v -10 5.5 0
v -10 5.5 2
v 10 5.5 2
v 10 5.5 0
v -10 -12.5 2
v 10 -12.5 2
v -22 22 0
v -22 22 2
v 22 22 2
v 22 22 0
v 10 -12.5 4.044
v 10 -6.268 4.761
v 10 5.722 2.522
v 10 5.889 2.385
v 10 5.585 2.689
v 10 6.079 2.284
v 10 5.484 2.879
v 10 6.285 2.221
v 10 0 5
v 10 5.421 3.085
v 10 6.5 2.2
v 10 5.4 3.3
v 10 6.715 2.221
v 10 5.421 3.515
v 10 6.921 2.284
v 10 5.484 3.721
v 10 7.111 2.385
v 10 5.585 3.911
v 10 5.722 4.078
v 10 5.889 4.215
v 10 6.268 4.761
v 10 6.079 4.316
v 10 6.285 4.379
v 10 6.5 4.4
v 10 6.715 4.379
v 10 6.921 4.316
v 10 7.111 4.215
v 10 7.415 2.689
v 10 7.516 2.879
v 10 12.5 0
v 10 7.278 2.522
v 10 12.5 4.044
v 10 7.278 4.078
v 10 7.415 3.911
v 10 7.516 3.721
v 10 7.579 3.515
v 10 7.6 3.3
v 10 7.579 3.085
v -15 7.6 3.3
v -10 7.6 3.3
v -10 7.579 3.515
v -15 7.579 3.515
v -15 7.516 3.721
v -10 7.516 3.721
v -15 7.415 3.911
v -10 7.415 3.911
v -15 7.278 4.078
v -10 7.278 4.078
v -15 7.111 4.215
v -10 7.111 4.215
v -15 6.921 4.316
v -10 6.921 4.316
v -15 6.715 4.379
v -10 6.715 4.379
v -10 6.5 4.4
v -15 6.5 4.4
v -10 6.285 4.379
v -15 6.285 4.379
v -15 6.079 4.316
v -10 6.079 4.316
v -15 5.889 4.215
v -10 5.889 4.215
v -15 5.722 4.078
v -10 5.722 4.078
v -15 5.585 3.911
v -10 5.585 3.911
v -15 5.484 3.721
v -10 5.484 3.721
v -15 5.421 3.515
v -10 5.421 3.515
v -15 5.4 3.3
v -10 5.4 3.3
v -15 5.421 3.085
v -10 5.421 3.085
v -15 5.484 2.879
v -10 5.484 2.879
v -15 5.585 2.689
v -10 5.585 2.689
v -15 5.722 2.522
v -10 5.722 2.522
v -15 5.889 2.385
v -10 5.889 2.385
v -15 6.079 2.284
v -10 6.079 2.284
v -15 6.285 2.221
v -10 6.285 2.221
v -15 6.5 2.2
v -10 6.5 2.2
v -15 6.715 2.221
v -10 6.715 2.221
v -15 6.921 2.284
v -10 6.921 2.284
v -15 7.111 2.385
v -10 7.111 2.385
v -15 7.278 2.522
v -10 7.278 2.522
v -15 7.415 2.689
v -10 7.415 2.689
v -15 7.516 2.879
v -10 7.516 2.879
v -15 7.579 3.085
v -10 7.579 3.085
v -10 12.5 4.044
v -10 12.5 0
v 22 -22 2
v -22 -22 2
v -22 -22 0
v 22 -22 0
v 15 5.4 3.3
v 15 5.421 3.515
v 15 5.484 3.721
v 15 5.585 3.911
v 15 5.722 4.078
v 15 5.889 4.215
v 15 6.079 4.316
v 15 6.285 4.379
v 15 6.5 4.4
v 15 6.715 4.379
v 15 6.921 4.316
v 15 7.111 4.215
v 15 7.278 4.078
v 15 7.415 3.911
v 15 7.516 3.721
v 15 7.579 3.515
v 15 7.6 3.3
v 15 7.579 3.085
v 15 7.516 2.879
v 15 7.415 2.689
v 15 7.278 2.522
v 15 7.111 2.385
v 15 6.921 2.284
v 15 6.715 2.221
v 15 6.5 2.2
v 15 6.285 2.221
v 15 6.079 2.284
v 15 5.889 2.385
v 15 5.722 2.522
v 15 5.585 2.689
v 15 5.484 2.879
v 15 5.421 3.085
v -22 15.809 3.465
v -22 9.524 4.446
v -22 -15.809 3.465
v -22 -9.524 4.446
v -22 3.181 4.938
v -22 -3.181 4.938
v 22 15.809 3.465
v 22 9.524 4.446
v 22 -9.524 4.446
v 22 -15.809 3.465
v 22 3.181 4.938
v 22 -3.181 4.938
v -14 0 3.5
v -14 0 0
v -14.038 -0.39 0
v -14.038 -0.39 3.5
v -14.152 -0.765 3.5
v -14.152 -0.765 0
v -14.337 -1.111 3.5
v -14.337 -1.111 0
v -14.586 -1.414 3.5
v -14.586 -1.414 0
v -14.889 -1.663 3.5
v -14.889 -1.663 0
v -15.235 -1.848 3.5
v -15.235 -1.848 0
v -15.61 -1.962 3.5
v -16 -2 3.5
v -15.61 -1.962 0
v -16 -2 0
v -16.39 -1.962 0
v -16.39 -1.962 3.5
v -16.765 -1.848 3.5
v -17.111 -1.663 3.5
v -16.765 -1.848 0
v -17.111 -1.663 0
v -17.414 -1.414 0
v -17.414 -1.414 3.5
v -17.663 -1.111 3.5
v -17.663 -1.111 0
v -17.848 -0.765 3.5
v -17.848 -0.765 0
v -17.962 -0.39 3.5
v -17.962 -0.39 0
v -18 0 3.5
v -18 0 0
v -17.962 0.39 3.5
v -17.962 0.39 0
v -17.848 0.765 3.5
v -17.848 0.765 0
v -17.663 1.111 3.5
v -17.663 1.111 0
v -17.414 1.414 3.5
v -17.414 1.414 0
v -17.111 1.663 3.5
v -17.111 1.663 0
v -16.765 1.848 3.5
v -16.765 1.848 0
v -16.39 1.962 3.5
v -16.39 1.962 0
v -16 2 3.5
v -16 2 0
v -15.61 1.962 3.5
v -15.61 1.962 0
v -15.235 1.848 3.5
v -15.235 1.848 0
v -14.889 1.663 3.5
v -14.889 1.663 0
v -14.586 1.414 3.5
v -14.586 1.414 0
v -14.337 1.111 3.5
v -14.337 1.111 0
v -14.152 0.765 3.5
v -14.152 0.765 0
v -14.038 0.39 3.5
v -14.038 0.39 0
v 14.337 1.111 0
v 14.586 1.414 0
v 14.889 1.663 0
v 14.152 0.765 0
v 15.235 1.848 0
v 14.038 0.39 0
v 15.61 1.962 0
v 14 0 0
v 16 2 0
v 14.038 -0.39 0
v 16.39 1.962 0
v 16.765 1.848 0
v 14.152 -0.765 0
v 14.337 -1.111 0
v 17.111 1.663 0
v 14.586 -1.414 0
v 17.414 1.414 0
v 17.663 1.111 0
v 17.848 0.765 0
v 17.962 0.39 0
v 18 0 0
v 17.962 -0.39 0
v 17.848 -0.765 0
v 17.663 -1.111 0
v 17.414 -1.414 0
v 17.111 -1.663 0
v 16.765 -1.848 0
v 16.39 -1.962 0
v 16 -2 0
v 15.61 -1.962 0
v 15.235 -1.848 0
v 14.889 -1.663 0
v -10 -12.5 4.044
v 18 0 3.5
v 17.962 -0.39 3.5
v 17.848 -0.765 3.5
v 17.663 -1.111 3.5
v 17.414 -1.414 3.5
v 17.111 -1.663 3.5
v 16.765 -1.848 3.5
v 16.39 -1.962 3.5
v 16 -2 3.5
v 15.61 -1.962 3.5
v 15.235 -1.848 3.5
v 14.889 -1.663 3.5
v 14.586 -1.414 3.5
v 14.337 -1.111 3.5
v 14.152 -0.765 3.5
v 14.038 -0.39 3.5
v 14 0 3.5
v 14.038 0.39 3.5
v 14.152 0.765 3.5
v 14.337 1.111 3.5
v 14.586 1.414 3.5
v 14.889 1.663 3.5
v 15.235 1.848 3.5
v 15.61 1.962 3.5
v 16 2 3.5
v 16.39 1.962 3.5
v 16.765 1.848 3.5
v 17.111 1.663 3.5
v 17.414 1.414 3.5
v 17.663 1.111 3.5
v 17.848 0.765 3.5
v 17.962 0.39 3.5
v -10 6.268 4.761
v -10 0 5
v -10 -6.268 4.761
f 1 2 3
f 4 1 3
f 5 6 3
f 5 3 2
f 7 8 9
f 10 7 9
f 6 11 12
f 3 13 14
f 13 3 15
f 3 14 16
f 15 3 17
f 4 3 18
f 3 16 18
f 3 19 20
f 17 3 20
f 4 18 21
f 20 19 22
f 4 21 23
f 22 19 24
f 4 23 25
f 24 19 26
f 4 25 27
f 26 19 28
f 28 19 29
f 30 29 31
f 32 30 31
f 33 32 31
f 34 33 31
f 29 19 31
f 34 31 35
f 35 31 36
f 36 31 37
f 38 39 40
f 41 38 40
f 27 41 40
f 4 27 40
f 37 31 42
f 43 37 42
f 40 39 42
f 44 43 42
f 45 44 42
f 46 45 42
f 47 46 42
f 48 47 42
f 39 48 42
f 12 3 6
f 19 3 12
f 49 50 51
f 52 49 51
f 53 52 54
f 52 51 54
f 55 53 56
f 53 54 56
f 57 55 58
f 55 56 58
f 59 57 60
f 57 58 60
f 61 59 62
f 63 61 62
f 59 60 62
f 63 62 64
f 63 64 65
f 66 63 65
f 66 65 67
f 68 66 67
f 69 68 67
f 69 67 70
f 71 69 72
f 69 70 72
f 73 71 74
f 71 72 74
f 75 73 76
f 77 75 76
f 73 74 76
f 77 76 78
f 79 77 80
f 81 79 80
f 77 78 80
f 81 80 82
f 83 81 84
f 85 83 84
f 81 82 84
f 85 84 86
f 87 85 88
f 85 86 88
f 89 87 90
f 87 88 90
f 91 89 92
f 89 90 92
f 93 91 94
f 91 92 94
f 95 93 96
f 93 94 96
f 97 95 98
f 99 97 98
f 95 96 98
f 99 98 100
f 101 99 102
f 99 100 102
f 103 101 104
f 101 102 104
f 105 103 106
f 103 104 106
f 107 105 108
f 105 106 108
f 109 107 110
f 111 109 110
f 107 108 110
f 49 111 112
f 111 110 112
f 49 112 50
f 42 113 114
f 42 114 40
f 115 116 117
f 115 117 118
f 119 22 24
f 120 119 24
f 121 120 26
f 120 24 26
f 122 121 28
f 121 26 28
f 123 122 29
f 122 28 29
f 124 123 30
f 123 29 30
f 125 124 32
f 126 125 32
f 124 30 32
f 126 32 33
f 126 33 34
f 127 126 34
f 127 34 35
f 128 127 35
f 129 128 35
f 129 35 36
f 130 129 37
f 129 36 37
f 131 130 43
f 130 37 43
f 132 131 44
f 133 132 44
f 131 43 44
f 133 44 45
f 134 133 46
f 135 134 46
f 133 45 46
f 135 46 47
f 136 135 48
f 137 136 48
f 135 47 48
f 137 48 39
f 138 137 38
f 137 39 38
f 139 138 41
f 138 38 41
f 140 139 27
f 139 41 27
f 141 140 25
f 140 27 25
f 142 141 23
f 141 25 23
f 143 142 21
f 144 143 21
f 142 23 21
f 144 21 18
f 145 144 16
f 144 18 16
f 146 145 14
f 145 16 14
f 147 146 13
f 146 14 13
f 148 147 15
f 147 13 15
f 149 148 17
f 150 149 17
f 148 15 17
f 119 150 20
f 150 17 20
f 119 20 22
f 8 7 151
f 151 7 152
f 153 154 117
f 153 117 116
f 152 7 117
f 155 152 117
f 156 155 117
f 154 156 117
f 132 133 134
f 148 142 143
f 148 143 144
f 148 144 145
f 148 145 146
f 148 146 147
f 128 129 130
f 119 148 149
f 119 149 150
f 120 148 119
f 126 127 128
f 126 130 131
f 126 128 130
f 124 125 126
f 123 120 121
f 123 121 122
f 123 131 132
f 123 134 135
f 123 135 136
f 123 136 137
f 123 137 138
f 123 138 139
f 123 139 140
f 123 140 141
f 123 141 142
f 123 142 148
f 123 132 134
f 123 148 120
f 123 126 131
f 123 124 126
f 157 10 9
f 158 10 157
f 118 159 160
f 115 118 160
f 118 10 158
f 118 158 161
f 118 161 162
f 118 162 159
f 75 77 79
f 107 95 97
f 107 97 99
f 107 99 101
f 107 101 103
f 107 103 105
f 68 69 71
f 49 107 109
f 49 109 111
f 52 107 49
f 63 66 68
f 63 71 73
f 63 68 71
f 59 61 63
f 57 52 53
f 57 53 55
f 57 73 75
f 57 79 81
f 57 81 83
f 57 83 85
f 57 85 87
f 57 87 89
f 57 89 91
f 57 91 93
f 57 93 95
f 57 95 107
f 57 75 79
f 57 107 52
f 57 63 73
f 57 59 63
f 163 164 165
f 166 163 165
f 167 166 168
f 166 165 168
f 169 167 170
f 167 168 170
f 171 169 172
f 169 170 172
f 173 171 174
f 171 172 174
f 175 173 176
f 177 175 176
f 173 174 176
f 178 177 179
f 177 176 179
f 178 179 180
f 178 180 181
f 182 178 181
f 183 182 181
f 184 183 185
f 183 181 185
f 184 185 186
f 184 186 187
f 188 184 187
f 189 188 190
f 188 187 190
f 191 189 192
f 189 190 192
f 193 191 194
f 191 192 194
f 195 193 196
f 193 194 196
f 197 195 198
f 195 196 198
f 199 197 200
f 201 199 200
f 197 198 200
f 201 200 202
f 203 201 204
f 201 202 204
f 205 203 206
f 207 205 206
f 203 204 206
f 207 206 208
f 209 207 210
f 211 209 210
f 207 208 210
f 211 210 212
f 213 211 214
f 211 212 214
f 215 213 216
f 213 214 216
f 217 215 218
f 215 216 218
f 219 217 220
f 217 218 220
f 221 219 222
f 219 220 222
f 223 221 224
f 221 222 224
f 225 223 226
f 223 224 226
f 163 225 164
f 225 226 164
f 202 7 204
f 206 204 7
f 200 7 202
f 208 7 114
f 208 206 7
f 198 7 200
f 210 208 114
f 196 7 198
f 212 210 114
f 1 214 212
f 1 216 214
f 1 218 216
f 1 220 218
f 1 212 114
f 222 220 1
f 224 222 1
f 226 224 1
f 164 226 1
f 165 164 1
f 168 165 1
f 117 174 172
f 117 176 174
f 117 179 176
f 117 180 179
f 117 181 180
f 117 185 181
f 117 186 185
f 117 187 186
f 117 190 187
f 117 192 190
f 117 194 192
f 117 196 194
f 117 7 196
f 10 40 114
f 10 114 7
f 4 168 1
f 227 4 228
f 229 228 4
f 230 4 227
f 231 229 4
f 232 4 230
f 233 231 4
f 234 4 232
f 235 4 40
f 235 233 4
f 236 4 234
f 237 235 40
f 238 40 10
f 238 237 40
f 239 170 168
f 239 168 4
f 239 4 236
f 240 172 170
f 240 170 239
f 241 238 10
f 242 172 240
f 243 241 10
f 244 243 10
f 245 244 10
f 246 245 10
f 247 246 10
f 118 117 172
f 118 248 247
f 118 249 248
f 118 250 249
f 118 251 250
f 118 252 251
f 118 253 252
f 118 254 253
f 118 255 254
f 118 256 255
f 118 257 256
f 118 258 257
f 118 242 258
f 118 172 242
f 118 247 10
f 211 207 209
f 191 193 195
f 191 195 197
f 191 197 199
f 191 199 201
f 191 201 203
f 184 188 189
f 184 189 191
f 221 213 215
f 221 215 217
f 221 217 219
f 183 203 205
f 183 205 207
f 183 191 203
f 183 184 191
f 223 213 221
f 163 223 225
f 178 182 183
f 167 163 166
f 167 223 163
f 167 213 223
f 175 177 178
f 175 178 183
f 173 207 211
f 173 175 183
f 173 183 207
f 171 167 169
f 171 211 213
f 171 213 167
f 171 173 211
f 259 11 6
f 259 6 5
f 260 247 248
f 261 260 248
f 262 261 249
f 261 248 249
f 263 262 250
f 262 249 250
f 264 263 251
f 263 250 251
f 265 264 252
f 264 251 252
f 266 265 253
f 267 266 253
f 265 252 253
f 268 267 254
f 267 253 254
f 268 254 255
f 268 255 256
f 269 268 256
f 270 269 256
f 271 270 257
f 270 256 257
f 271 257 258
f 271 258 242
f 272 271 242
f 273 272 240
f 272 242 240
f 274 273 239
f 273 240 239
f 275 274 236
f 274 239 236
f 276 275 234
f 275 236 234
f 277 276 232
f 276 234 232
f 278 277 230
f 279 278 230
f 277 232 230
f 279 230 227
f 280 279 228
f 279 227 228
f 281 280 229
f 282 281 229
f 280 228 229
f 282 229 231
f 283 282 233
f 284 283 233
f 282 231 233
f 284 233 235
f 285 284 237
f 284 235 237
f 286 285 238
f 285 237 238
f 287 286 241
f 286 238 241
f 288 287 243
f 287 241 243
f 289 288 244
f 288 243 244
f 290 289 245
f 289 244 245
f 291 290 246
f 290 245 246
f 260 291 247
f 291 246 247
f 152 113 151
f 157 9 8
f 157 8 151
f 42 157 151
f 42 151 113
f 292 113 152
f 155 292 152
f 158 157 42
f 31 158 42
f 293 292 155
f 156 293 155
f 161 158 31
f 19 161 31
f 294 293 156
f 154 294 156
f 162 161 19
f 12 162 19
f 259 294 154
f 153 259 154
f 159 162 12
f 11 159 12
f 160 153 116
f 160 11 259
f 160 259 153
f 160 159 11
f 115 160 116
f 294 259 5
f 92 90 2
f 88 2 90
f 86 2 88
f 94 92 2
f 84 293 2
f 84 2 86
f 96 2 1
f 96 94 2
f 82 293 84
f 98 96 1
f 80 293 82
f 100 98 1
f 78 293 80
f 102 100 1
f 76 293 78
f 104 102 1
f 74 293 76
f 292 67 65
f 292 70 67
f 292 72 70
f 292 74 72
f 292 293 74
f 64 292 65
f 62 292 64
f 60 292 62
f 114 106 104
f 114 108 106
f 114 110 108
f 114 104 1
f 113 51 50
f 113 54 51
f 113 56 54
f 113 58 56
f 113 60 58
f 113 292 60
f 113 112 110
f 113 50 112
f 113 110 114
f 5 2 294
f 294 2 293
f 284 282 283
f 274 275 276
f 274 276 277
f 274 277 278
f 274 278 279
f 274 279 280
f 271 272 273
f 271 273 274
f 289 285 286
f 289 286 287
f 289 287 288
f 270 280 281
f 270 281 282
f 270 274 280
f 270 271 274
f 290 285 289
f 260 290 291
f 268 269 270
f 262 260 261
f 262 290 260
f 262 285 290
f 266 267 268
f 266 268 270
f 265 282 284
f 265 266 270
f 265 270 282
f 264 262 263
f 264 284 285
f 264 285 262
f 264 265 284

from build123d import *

# Parameters (mm, degrees)
PAD001_DEPTH    = 22
SKETCH_W        = 44
SKETCH_H        = 5
PAD_DEPTH       = 22
SKETCH001_W     = 20
SKETCH001_H     = 25
POCKET_DEPTH    = 3
SKETCH003_R     = 1.1
POCKET001_DEPTH = 5
SKETCH004_R     = 1.1
POCKET002_DEPTH = 5
SKETCH005_W     = 20
SKETCH005_H     = 7
POCKET003_DEPTH = 2.001
SKETCH007_R     = 2
POCKET004_DEPTH = 3.5


with BuildPart() as pad001:
    # Sketch002 → Pad001 (new body, symmetric)
    with BuildSketch(Plane.YZ):
        with BuildLine():
            Line((-22, 0), (22, 0))
            Line((22, 0), (22, 2))
            ThreePointArc((22, 2), (0, 5), (-22, 2))
            Line((-22, 2), (-22, 0))
        make_face()
    extrude(amount=PAD001_DEPTH, both=True)


with BuildPart() as base_tirador:
    # Sketch → Pad (new body, symmetric)
    with BuildSketch(Plane.XZ):
        with Locations((0, 2.5)):
            Rectangle(SKETCH_W, SKETCH_H)
    extrude(amount=PAD_DEPTH, both=True)

    # Sketch001 → Pocket (cut)
    with BuildSketch(Plane(origin=(0, 0, 5), x_dir=(-1, 0, 0), z_dir=(0, 0, 1))):
        Rectangle(SKETCH001_W, SKETCH001_H)
    extrude(amount=-POCKET_DEPTH, mode=Mode.SUBTRACT)

    # Common: intersect Pad001
    add(pad001.part, mode=Mode.INTERSECT)

    # Sketch003 → Pocket001 (cut)
    with BuildSketch(Plane.YZ.offset(-10)):
        with Locations((6.5, 3.3)):
            Circle(SKETCH003_R)
    extrude(amount=-POCKET001_DEPTH, mode=Mode.SUBTRACT)

    # Sketch004 → Pocket002 (cut)
    with BuildSketch(Plane(origin=(10, 0, 0), x_dir=(0, -1, 0), z_dir=(-1, 0, 0))):
        with Locations((-6.5, 3.3)):
            Circle(SKETCH004_R)
    extrude(amount=-POCKET002_DEPTH, mode=Mode.SUBTRACT)

    # Sketch005 → Pocket003 (cut, through all)
    with BuildSketch(Plane.XY.offset(2)):
        with Locations((0, 9)):
            Rectangle(SKETCH005_W, SKETCH005_H)
    extrude(amount=-POCKET003_DEPTH, mode=Mode.SUBTRACT)

    # Sketch007 → Pocket004 (cut)
    with BuildSketch(Plane(origin=(0, 0, 0), x_dir=(1, 0, 0), z_dir=(0, 0, -1))):
        with Locations((-16, 0)):
            Circle(SKETCH007_R)
        with Locations((16, 0)):
            Circle(SKETCH007_R)
    extrude(amount=-POCKET004_DEPTH, mode=Mode.SUBTRACT)


solid = base_tirador.part
